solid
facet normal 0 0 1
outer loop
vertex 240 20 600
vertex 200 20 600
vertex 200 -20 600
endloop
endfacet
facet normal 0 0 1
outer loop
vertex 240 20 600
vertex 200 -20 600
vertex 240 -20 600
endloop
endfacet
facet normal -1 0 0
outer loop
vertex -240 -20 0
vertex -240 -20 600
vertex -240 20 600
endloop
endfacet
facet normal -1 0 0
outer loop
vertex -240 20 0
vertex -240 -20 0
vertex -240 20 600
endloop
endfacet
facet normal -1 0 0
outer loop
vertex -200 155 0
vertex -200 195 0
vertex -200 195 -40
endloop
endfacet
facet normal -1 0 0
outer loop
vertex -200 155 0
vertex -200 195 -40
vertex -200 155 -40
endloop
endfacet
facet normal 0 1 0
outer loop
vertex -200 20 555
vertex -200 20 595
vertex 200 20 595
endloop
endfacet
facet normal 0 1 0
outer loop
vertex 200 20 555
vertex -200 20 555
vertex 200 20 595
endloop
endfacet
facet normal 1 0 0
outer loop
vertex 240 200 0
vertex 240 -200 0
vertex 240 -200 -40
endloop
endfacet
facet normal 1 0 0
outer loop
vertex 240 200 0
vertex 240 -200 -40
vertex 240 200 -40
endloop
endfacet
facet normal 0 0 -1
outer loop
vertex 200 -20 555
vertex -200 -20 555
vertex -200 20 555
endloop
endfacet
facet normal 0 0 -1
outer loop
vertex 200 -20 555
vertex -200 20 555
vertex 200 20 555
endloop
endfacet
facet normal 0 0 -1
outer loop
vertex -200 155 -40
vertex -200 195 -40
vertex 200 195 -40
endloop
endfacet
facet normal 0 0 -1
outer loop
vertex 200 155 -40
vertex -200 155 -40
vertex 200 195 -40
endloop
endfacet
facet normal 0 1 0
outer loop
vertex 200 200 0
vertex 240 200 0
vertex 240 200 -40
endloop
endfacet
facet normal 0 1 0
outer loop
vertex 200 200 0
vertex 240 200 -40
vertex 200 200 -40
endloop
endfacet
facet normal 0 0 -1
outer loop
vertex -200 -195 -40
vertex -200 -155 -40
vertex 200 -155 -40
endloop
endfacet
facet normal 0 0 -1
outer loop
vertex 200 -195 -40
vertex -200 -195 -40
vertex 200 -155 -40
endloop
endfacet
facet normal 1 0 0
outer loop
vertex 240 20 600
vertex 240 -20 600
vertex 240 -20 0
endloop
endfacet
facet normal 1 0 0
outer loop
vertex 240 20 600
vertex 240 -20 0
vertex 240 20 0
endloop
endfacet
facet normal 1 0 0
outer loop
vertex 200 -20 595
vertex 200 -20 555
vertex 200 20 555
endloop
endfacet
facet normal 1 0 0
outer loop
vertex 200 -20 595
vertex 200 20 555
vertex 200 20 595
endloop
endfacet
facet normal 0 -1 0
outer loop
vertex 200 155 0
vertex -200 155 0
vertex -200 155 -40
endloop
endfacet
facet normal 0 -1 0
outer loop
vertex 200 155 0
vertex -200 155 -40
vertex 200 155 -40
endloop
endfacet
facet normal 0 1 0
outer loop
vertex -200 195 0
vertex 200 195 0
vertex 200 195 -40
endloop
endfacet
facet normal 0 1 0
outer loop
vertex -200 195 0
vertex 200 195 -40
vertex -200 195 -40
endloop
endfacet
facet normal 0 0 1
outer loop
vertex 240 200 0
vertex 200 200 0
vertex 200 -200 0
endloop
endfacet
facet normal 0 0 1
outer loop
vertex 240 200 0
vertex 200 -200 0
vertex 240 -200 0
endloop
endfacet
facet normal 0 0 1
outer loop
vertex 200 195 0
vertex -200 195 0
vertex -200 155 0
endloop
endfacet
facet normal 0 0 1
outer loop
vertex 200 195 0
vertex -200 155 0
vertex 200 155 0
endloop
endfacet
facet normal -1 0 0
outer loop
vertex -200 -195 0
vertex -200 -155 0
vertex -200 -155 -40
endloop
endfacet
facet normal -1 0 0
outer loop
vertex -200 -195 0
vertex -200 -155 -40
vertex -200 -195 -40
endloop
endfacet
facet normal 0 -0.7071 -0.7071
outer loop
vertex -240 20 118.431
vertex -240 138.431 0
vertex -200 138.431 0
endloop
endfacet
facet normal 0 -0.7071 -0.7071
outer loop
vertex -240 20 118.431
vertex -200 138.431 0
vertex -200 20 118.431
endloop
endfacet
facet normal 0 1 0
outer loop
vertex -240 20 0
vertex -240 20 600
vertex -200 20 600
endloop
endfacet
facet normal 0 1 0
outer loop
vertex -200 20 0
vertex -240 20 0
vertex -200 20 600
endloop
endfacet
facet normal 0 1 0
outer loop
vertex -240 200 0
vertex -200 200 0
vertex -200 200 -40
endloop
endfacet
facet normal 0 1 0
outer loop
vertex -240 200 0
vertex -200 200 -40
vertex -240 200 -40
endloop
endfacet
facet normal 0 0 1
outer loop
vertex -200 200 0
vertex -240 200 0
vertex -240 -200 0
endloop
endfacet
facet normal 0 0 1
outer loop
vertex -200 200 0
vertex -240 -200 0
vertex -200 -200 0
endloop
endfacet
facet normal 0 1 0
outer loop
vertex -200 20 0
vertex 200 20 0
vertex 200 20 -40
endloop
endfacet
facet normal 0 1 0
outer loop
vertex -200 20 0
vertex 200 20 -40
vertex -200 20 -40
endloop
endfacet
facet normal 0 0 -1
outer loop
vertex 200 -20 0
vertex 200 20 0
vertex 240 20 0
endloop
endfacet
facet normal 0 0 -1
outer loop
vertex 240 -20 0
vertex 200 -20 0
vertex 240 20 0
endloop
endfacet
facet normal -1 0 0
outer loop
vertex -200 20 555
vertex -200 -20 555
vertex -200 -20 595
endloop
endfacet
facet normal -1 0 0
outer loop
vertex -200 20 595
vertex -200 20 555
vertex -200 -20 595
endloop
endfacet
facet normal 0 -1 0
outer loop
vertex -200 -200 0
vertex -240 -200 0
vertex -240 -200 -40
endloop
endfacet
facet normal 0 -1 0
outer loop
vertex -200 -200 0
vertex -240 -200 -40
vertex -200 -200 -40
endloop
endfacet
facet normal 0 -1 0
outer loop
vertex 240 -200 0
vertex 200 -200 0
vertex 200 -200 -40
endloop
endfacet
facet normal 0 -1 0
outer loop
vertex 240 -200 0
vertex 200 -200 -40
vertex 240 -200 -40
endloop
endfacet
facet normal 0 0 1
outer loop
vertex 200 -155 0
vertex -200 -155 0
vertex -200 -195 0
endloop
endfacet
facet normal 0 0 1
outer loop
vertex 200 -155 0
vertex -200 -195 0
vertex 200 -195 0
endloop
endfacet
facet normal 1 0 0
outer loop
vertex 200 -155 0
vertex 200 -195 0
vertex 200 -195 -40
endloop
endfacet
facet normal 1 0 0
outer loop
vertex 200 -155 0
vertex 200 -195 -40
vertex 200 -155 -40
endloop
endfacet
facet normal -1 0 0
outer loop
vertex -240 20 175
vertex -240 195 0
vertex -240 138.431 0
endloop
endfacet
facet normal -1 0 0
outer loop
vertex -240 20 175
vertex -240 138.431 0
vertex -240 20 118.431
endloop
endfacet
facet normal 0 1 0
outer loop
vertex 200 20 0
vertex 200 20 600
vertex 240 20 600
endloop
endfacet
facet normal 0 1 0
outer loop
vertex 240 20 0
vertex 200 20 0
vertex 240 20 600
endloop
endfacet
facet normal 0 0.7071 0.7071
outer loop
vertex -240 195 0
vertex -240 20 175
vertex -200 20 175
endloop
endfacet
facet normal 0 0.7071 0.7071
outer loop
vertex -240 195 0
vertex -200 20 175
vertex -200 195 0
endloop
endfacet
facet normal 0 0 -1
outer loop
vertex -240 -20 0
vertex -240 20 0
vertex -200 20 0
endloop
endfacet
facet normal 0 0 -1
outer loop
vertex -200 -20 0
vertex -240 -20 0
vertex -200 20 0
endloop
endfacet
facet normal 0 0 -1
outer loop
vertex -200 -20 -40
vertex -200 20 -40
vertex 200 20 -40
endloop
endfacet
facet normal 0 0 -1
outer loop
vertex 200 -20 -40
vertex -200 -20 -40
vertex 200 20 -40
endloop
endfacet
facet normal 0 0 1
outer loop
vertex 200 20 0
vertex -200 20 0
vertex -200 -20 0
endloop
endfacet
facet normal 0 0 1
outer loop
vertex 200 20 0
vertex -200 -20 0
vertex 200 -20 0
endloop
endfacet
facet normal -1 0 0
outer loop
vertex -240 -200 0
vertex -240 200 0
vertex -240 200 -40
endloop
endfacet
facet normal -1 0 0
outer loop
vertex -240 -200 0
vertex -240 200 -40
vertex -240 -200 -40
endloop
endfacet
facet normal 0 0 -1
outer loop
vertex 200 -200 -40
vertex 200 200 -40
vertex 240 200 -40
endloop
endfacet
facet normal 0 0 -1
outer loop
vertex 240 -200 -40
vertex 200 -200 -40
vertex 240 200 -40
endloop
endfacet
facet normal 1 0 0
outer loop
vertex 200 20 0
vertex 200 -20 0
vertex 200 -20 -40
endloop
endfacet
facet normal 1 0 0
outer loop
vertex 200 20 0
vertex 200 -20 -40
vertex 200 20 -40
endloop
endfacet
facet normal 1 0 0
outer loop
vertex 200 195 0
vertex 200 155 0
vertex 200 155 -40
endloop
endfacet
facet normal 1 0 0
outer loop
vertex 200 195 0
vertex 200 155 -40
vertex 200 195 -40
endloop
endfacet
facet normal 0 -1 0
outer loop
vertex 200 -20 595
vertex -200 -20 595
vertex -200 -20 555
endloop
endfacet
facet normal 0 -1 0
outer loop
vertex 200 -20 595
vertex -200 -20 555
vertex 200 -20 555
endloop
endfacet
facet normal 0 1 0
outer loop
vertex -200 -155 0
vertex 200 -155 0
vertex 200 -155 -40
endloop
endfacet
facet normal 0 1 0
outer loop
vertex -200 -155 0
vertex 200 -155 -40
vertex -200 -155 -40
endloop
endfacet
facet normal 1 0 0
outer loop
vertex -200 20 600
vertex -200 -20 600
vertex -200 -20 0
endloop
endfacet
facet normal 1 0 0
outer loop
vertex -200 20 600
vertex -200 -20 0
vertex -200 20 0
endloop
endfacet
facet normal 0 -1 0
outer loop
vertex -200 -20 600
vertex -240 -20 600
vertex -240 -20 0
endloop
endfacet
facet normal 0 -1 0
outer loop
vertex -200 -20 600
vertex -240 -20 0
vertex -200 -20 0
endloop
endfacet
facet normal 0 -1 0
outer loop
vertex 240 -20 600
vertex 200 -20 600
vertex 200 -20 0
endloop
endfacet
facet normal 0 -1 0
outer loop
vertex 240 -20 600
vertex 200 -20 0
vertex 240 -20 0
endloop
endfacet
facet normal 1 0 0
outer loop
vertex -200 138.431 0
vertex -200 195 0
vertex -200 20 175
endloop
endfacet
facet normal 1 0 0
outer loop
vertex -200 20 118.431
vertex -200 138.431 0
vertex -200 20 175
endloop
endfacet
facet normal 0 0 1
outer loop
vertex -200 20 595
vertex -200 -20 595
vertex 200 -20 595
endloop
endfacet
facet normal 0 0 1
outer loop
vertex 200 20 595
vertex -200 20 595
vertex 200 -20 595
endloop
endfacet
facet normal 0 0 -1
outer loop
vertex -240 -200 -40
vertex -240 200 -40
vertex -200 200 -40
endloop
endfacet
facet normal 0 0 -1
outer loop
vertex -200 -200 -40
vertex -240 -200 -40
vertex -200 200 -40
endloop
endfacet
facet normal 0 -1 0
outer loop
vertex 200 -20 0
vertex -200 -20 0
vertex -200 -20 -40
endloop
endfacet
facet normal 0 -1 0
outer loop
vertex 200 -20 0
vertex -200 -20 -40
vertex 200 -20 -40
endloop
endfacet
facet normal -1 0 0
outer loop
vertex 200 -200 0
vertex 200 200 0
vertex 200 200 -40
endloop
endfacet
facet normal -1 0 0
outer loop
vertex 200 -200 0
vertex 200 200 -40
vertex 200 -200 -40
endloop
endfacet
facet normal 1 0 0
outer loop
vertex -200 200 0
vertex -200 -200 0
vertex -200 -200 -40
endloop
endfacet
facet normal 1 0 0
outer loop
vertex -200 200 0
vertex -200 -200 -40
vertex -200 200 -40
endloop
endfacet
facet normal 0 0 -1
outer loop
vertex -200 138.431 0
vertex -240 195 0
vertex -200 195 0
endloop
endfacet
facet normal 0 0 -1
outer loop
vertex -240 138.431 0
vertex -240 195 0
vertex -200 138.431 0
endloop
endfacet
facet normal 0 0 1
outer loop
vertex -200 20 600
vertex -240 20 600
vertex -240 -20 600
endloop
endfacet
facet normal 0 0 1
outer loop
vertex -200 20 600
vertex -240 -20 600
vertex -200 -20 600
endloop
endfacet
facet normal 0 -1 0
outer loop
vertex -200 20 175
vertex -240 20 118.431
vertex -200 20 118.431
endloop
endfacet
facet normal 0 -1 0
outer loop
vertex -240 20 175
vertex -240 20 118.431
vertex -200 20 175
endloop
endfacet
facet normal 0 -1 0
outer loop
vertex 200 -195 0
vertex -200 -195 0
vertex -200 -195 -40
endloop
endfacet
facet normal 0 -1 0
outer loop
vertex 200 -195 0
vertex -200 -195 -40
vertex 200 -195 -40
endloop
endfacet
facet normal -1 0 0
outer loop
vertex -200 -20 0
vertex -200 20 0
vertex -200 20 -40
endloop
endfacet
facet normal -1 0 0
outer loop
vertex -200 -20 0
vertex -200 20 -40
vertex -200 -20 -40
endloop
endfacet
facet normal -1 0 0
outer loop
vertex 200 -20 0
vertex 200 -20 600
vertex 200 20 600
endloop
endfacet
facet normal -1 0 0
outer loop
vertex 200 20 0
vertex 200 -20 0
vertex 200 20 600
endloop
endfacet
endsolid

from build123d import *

# Parameters (mm, degrees)
F1_W     = 40
F1_H     = 40
F2_DEPTH = 40
F3_DEPTH = 40
F4_DEPTH = 600
F5_W     = 400
F5_H     = 40
F6_DEPTH = 40
F8_DEPTH = 40


with BuildPart() as f2:
    # F1 (on Top) → F2 (new body)
    with BuildSketch(Plane.XY):
        Polygon((-200, 200), (-240, 200), (-240, 20), (-200, 20), (-200, 155), (-200, 195), align=None)
        with Locations((-220, 0)):
            Rectangle(F1_W, F1_H)
        Polygon((-200, -20), (-240, -20), (-240, -200), (-200, -200), (-200, -195), (-200, -155), align=None)
    extrude(amount=-F2_DEPTH)


with BuildPart() as f2b:
    # F1 (on Top) → F2, piece 2 (new body)
    with BuildSketch(Plane.XY):
        Polygon((200, 200), (200, 195), (200, 155), (200, 20), (240, 20), (240, 200), align=None)
        with Locations((220, 0)):
            Rectangle(F1_W, F1_H)
        Polygon((240, -20), (200, -20), (200, -155), (200, -195), (200, -200), (240, -200), align=None)
    extrude(amount=-F2_DEPTH)


with BuildPart() as f3:
    # F1 (on Top) → F3 (new body)
    with BuildSketch(Plane.XY):
        Polygon((0, 20), (-200, 20), (-200, -20), (0, -20), (200, -20), (200, 20), align=None)
    extrude(amount=-F3_DEPTH)


with BuildPart() as f3b:
    # F1 (on Top) → F3, piece 2 (new body)
    with BuildSketch(Plane.XY):
        Polygon((0, -155), (-200, -155), (-200, -195), (0, -195), (200, -195), (200, -155), align=None)
    extrude(amount=-F3_DEPTH)


with BuildPart() as f3c:
    # F1 (on Top) → F3, piece 3 (new body)
    with BuildSketch(Plane.XY):
        Polygon((0, 195), (-200, 195), (-200, 155), (0, 155), (200, 155), (200, 195), align=None)
    extrude(amount=-F3_DEPTH)


with BuildPart() as f4:
    # F1 (on Top) → F4 (new body)
    with BuildSketch(Plane.XY):
        with Locations((-220, 0)):
            Rectangle(F1_W, F1_H)
    extrude(amount=F4_DEPTH)


with BuildPart() as f4b:
    # F1 (on Top) → F4, piece 2 (new body)
    with BuildSketch(Plane.XY):
        with Locations((220, 0)):
            Rectangle(F1_W, F1_H)
    extrude(amount=F4_DEPTH)


with BuildPart() as f6:
    # F5 (on face) → F6 (new body)
    with BuildSketch(Plane.XZ.offset(20)):
        with Locations((0, 575)):
            Rectangle(F5_W, F5_H)
    extrude(amount=-F6_DEPTH)


with BuildPart() as f8:
    # F7 (on face) → F8 (new body)
    with BuildSketch(Plane(origin=(-240, 0, 0), x_dir=(0, -1, 0), z_dir=(-1, 0, 0))):
        Polygon((-20, 175), (-195, 0), (-138.4314575051, 0), (-20, 118.4314575051), align=None)
    extrude(amount=-F8_DEPTH)


solid = Compound([f2.part, f2b.part, f3.part, f3b.part, f3c.part, f4.part, f4b.part, f6.part, f8.part])
